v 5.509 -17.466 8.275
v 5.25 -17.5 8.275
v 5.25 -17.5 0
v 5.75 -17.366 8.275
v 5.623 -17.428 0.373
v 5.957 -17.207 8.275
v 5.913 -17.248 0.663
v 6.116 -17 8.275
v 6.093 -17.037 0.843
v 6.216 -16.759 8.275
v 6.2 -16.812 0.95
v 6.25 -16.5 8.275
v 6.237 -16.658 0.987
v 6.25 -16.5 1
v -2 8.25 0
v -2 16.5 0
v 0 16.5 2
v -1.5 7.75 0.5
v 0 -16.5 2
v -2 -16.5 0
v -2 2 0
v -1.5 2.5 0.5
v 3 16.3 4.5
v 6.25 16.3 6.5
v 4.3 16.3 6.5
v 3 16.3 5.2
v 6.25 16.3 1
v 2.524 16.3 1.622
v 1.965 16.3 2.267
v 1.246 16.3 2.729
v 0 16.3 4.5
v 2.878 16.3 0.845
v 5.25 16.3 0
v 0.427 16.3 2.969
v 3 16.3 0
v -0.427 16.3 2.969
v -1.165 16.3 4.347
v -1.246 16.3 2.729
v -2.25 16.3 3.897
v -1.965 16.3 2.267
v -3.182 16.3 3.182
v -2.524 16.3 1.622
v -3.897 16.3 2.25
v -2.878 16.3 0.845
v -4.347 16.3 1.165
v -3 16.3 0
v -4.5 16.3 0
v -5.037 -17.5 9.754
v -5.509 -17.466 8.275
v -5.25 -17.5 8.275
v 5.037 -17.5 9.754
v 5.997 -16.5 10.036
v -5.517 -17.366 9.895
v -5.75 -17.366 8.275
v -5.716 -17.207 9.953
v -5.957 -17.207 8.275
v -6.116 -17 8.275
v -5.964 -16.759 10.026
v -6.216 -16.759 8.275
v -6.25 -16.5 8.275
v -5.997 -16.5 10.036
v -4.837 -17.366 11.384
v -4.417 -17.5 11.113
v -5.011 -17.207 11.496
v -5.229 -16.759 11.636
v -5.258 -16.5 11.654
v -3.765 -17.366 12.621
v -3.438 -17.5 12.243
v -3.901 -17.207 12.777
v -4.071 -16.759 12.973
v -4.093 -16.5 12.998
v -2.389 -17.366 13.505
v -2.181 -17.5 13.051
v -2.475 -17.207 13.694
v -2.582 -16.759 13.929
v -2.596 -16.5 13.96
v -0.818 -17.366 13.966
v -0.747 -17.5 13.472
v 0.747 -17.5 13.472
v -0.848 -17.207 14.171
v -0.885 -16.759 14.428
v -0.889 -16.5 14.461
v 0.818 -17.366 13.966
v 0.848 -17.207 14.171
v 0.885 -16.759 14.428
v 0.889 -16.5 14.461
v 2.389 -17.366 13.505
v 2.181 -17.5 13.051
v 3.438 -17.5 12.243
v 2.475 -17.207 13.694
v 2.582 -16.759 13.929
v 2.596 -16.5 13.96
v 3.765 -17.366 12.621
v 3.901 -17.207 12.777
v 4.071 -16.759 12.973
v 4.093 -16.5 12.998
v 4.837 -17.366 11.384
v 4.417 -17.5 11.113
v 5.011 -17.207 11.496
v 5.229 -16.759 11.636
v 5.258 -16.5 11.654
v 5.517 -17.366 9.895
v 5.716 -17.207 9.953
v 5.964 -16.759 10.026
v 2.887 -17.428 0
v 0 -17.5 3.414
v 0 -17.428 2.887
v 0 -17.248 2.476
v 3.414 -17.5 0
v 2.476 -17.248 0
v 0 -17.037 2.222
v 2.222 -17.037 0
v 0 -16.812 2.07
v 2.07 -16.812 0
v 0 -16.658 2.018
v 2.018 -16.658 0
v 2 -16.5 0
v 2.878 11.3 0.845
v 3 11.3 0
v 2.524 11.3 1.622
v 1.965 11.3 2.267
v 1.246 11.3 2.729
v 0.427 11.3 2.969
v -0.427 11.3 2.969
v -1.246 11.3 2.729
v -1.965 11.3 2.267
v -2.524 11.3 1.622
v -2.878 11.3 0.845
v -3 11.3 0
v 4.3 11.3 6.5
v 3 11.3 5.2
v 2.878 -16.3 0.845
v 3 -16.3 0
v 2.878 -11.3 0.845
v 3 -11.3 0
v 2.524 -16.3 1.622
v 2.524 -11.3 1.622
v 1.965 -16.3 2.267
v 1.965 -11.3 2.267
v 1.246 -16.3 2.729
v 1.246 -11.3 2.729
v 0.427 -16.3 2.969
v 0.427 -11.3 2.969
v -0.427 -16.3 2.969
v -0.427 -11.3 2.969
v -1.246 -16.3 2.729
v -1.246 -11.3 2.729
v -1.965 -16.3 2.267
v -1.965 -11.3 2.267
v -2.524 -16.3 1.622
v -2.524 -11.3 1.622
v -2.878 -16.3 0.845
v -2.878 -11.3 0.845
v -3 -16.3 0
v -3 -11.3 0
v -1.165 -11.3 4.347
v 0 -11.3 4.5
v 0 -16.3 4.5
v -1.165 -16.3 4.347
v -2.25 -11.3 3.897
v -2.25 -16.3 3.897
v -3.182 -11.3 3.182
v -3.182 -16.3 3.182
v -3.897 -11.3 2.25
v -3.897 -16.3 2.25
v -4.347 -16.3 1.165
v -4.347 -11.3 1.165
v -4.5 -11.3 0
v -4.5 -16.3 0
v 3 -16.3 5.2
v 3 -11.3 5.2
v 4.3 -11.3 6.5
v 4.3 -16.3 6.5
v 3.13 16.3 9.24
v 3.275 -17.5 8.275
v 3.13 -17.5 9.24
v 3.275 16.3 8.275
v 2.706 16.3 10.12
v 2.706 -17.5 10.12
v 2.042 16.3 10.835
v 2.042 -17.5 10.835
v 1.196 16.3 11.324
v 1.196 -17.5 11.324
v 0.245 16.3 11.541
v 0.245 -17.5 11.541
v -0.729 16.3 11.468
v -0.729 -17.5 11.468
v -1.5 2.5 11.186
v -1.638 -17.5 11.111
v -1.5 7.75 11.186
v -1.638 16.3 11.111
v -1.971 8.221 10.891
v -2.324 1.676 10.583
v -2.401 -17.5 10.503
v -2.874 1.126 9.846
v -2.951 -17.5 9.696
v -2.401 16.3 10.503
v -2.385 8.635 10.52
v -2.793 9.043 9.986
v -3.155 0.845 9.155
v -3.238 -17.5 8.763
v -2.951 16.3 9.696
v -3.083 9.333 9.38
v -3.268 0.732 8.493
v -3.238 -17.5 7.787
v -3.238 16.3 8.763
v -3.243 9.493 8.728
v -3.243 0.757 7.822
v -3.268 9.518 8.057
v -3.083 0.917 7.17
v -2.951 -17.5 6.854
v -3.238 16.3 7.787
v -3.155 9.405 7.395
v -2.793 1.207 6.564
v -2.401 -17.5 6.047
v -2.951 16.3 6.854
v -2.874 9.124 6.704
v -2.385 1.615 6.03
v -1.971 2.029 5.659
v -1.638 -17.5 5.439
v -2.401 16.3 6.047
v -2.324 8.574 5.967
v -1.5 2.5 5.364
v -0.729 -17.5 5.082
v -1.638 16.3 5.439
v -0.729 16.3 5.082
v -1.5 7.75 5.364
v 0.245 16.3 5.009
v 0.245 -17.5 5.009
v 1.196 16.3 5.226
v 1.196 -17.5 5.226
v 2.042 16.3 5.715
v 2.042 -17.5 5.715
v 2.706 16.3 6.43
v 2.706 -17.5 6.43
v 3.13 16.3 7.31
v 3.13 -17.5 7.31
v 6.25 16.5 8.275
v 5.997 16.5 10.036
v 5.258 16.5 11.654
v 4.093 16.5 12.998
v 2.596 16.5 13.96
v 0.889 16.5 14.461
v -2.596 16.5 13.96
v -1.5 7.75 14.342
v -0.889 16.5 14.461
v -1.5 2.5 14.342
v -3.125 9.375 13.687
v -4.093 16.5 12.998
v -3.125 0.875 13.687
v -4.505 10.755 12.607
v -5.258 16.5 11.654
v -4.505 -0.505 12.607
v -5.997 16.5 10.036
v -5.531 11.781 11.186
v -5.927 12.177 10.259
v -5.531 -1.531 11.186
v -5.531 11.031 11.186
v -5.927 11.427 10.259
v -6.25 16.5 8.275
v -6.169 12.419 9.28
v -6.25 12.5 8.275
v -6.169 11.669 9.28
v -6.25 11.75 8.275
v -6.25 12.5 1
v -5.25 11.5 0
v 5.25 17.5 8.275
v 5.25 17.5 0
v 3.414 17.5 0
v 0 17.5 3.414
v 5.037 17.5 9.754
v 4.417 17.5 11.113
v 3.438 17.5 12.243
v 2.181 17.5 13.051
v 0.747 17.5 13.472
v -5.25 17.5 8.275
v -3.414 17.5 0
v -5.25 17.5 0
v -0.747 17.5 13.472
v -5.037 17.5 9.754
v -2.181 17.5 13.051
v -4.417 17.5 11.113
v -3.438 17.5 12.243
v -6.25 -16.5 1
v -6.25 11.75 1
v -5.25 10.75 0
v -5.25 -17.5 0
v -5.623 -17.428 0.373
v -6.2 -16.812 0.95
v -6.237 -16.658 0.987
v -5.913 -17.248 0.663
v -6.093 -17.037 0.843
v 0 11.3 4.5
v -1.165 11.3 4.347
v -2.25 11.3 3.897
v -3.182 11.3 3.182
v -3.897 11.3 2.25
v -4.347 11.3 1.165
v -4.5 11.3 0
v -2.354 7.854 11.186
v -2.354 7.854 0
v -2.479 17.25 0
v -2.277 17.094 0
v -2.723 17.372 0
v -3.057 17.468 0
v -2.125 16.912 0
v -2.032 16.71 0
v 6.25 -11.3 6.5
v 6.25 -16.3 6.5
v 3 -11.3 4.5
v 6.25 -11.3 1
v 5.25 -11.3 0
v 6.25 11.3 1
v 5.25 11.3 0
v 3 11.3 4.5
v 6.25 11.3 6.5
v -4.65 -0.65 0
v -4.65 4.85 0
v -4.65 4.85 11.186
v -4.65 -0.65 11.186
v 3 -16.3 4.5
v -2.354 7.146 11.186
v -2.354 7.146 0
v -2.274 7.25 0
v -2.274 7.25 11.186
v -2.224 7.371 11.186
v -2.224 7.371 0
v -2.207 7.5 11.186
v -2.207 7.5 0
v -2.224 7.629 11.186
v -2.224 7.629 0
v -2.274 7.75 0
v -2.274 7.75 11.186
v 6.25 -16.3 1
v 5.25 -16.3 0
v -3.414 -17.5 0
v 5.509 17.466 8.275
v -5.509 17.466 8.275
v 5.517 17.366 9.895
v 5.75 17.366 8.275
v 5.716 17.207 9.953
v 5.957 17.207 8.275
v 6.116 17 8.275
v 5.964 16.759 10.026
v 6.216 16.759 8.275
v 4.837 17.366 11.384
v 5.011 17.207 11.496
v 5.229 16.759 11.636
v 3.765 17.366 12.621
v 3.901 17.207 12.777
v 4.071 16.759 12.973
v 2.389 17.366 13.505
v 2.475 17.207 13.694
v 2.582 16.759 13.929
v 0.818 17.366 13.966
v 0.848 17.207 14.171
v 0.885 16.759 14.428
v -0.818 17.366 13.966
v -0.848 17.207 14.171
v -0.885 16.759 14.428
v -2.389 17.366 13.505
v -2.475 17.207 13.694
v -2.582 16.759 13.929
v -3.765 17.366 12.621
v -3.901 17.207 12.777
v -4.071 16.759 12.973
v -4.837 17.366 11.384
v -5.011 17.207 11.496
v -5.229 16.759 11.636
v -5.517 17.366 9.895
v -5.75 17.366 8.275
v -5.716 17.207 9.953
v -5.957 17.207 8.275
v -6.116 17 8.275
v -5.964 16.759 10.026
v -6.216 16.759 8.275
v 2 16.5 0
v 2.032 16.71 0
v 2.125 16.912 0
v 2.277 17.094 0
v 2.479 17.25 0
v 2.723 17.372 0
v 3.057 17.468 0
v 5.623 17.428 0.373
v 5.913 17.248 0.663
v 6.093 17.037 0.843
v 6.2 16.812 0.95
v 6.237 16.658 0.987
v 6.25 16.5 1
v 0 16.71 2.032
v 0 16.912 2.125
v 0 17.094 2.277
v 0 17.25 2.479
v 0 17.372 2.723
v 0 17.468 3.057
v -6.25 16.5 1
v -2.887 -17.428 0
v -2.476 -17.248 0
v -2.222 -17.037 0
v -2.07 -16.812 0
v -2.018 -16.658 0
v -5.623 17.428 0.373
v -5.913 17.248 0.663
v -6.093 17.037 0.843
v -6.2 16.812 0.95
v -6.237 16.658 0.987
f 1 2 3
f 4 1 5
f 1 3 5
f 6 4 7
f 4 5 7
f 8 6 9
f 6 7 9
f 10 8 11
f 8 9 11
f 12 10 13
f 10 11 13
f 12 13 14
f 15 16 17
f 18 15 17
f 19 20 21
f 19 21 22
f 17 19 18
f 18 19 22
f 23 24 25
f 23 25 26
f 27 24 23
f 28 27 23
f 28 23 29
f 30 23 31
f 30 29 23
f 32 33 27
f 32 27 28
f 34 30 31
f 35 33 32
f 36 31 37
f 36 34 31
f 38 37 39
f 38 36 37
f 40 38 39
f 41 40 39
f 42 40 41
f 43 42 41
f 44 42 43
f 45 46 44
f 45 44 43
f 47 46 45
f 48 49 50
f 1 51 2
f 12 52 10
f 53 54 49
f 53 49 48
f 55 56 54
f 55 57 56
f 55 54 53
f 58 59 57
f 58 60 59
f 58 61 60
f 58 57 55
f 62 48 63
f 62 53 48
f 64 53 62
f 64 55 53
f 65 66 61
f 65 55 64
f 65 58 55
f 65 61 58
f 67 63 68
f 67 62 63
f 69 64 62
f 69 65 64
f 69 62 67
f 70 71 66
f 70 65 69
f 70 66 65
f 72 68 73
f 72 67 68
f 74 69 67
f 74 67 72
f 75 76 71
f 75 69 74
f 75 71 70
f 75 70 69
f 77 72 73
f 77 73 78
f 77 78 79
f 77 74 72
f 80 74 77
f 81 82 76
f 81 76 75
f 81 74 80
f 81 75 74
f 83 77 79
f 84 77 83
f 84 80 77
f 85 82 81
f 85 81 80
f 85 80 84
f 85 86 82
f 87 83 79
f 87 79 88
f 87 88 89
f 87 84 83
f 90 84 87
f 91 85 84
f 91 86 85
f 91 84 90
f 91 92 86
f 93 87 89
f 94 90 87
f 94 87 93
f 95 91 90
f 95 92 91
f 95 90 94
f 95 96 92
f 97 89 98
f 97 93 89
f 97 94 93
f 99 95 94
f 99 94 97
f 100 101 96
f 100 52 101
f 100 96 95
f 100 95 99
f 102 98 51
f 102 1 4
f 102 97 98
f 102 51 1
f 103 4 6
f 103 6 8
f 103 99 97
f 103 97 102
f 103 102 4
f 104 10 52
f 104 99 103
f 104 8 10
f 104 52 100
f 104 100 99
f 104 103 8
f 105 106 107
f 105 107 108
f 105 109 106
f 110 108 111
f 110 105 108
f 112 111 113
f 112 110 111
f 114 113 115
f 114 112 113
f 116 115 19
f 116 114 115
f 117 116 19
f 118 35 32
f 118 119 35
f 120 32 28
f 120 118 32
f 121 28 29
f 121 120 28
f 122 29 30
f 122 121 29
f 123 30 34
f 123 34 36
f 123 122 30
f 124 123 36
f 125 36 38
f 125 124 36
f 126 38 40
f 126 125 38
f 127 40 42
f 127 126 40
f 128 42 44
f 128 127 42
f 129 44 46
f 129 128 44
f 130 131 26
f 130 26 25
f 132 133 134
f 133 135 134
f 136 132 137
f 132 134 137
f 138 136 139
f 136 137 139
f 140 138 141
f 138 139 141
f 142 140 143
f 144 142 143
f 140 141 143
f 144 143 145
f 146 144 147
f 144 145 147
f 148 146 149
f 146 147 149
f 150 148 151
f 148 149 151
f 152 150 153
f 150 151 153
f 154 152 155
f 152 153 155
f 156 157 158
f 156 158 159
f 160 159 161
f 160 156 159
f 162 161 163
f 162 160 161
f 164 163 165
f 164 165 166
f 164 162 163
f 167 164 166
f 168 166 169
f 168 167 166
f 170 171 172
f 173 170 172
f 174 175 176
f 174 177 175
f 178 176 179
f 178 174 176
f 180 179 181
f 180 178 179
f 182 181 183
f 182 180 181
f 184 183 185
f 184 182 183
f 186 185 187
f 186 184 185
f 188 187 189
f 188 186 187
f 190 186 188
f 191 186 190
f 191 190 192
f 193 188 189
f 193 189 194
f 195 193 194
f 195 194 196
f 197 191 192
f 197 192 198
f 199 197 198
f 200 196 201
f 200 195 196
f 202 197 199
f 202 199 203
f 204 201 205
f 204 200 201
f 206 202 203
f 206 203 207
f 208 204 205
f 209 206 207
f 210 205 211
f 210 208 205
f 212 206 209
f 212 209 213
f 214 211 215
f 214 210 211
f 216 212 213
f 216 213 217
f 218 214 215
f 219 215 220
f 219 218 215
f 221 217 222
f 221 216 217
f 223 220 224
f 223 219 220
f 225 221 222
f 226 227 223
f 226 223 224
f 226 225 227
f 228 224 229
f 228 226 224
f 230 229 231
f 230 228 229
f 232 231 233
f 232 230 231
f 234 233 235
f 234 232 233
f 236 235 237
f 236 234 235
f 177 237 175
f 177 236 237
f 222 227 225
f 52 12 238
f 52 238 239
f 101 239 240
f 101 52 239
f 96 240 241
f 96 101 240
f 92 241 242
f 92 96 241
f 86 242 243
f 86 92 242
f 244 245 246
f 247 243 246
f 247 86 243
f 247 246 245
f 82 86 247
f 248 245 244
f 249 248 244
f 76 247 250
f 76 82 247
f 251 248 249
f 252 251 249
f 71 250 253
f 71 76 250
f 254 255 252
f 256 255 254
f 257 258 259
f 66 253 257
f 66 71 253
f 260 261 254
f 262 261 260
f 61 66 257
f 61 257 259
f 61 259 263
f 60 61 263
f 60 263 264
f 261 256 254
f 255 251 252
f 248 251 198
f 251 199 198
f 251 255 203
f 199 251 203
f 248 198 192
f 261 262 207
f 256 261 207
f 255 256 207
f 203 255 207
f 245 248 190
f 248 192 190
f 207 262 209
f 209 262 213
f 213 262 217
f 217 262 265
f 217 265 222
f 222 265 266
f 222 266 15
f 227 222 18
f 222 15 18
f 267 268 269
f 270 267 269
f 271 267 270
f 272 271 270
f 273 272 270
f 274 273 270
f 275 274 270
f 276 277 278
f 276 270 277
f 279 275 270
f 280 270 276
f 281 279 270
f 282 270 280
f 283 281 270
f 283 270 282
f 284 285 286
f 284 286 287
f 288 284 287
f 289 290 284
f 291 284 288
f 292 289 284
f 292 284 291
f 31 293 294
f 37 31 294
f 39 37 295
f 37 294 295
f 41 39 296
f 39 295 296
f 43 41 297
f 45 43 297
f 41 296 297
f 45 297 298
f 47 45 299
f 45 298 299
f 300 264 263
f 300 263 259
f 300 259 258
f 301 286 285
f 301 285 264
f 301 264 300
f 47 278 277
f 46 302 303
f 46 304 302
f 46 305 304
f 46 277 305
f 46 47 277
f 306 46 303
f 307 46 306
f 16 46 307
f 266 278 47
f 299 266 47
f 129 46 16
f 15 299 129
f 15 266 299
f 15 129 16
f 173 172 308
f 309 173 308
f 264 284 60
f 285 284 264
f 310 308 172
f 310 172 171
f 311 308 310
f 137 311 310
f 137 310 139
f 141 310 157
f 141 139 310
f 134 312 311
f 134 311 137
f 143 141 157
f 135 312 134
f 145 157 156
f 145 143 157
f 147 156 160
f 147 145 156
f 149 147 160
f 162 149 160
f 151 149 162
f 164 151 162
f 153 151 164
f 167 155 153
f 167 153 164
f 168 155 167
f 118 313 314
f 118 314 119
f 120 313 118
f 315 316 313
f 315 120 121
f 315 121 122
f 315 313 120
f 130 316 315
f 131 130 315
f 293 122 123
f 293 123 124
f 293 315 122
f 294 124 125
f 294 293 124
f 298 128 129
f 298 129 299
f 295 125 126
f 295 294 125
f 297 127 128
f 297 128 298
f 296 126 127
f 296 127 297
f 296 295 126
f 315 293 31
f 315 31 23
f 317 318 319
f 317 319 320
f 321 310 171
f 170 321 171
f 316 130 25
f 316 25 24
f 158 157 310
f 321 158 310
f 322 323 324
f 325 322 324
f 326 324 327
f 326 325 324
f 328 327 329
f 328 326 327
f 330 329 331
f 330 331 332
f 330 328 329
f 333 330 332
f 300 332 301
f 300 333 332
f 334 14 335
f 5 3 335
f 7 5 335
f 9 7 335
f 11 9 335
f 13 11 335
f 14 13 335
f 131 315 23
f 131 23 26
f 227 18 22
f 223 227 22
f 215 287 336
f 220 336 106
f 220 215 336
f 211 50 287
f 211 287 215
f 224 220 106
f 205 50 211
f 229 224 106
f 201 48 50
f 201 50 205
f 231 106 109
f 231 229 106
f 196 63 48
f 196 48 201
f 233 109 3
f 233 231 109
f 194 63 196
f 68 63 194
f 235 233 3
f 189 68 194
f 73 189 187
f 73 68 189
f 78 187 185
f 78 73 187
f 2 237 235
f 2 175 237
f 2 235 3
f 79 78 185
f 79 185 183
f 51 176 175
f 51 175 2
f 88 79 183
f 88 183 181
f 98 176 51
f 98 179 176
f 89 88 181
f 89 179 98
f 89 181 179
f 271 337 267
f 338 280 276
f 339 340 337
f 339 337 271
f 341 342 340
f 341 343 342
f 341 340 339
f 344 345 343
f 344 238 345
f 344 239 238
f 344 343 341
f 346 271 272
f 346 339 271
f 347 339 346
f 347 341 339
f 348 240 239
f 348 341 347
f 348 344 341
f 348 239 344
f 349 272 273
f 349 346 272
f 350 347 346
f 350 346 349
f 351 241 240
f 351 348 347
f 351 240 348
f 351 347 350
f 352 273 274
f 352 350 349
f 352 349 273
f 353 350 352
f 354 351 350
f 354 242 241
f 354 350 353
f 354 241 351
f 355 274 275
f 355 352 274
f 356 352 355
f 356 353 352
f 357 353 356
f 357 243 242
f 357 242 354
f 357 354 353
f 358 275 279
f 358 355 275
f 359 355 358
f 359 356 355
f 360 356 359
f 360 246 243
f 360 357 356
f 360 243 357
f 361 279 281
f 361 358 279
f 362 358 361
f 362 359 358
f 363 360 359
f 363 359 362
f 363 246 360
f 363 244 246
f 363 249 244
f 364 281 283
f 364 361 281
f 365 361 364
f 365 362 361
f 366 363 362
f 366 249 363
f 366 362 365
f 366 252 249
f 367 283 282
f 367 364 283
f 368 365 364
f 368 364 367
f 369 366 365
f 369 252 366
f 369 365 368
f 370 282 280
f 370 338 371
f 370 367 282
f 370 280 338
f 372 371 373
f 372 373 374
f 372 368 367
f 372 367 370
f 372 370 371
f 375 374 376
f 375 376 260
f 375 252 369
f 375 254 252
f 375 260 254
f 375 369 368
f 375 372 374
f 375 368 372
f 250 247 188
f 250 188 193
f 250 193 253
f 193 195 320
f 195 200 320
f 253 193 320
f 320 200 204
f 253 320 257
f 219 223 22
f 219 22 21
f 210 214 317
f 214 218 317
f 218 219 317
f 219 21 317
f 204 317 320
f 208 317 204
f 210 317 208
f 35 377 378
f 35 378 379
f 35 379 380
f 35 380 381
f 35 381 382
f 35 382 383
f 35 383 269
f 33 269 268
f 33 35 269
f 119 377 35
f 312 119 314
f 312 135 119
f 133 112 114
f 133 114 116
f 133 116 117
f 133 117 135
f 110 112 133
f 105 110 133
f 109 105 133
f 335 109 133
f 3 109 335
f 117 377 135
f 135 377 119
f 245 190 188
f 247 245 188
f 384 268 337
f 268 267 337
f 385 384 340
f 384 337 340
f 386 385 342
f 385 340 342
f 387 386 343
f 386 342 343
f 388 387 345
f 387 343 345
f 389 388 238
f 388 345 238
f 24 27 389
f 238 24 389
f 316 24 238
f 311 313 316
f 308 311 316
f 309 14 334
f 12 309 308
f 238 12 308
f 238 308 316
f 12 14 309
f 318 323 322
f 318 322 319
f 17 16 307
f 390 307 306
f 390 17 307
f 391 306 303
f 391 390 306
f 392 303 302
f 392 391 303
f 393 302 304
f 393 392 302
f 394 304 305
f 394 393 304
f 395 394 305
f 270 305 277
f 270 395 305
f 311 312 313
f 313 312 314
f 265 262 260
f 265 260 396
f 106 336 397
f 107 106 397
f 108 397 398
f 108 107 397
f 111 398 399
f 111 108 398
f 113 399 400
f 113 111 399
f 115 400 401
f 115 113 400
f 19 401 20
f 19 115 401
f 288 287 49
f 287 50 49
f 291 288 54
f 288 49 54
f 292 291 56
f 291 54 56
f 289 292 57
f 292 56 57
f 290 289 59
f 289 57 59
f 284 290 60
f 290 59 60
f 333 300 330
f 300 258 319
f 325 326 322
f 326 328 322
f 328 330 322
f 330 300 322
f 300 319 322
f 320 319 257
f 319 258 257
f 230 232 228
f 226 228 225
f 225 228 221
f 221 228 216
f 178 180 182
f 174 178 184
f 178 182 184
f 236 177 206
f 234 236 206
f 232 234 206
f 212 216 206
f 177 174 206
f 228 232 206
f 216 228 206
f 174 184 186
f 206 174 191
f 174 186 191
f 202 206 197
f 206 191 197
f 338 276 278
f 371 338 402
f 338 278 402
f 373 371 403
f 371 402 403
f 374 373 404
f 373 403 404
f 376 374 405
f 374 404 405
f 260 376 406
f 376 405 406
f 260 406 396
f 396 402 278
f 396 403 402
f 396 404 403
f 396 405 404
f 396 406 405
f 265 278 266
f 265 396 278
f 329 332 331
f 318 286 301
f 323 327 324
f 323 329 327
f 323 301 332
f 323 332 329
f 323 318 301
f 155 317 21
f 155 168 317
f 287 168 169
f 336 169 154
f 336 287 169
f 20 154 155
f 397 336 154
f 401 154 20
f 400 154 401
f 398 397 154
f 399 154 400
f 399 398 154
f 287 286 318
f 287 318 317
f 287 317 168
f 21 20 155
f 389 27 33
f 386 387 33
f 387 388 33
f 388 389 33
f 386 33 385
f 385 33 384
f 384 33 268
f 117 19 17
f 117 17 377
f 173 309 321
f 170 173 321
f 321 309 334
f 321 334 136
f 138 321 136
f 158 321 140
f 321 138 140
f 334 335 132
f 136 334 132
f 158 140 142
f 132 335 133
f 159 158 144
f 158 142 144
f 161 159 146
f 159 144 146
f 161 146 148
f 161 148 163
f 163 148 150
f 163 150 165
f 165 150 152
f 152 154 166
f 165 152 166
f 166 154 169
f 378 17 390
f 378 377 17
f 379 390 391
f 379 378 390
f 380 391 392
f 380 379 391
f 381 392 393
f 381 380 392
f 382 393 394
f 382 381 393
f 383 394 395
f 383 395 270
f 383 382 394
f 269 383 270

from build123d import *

# Parameters (mm, degrees)
F0_R      = 3.275
F1_DEPTH  = 17.5
F3_DEPTH  = 14.526
F5_DEPTH  = 11.1862926682
F7_DEPTH  = 35.001
F8_R      = 0.5
F9_W      = 1.5
F9_H      = 5
F12_DEPTH = 5
F13_SIZE  = 1
F14_R     = 1
F15_R     = 3.275
F16_DEPTH = 1.2


# Not quite as in the source:
# - a pattern or mirror of a feature is missing from the dataset's text; its kind, count and spacing are read off the source's solid
# - a feature names something its author has since deleted; it is built from what else it names


with BuildPart() as f1:
    # F0 (on Front) → F1 (new body, symmetric)
    with BuildSketch(Plane.XZ):
        with BuildLine():
            Line((-6.25, 8.275), (-6.25, 0))
            Line((-6.25, 0), (-2, 0))
            Line((-2, 0), (0, 2))
            Line((0, 2), (2, 0))
            Line((2, 0), (6.25, 0))
            Line((6.25, 0), (6.25, 8.275))
            ThreePointArc((6.25, 8.275), (0, 14.525), (-6.25, 8.275))
        make_face()
        with Locations((0, 8.275)):
            Circle(F0_R, mode=Mode.SUBTRACT)
    extrude(amount=F1_DEPTH, both=True)

    # F2 (on face) → F3 (cut, through all)
    with BuildSketch(Plane(origin=(0, 0, 0), x_dir=(1, 0, 0), z_dir=(0, 0, -1))):
        Polygon((-1.5, -2.5), (-6.25, 2.25), (-6.25, -12.5), (-1.5, -7.75), align=None)
    extrude(amount=-F3_DEPTH, mode=Mode.SUBTRACT)

    # F4 (on face) → F5 (join, through all)
    with BuildSketch(Plane(origin=(0, 0, 0), x_dir=(1, 0, 0), z_dir=(0, 0, -1))):
        Polygon((-4.65, 0.65), (-6.25, 2.25), (-6.25, -11.75), (-2, -7.5), (-4.65, -4.85), align=None)
    extrude(amount=-F5_DEPTH)

    # F6 (on face) → F7 (cut, through all)
    with BuildSketch(Plane.XZ.offset(17.5)):
        with BuildLine():
            Line((-6.25, 11.1862926682), (-6.25, 8.275))
            ThreePointArc((-6.25, 8.275), (-6.0674696664, 9.774437177), (-5.5305402087, 11.1862926682))
            Line((-5.5305402087, 11.1862926682), (-6.25, 11.1862926682))
        make_face()
    extrude(amount=-F7_DEPTH, mode=Mode.SUBTRACT)

    # F8
    f8_edges = [f1.edges().sort_by_distance(p)[0] for p in [
        (-2, 7.5, 5.593146),
    ]]
    fillet(f8_edges, radius=F8_R)

    # F9 (on face) → F10 (revolve, cut)
    with BuildSketch(Plane(origin=(0, 0, 0), x_dir=(1, 0, 0), z_dir=(0, 0, -1))):
        with Locations((-3.75, -13.8)):
            Rectangle(F9_W, F9_H)
    f10 = revolve(axis=Axis((0, 0.2600380681, 0), (0, -1, 0)), mode=Mode.SUBTRACT)

    # F10_copies: F10 across plane
    add(f10.mirror(Plane(origin=(0, 0, 0), x_dir=(0, 0, -1), z_dir=(0, -1, 0))), mode=Mode.SUBTRACT)

    # F11 (on face) → F12 (cut, through all)
    with BuildSketch(Plane(origin=(0, 11.3, 0), x_dir=(-1, 0, 0), z_dir=(0, 1, 0))):
        with BuildLine():
            ThreePointArc((-4.5, 0), (-3.1819805153, 3.1819805153), (0, 4.5))
            Line((0, 4.5), (-3, 4.5))
            Line((-3, 4.5), (-3, 5.2))
            Line((-3, 5.2), (-4.3, 6.5))
            Line((-4.3, 6.5), (-6.25, 6.5))
            Line((-6.25, 6.5), (-6.25, 4.5))
            Line((-6.25, 4.5), (-6.25, 0))
            Line((-6.25, 0), (-4.5, 0))
        make_face()
    f12 = extrude(amount=F12_DEPTH, mode=Mode.SUBTRACT)

    # F12_copies: F12 across plane
    add(f12.mirror(Plane(origin=(0, 0, 0), x_dir=(0, 0, -1), z_dir=(0, -1, 0))), mode=Mode.SUBTRACT)

    # F13
    f13_edges = [f1.edges().sort_by_distance(p)[0] for p in [
        (-6.25, 15, 0),
        (-6.25, -2.875, 0),
        (6.25, 0, 0),
        (6.25, -16.9, 0),
        (6.25, 16.9, 0),
    ]]
    chamfer(f13_edges, length=F13_SIZE)

    # F14
    f14_edges = [f1.edges().sort_by_distance(p)[0] for p in [
        (-1, 17.5, 1),
        (1, 17.5, 1),
        (-1, -17.5, 1),
        (1, -17.5, 1),
        (-6.25, 17.5, 4.6375),
        (0, -17.5, 14.525),
        (0, 17.5, 14.525),
        (6.25, 17.5, 4.6375),
        (-6.25, -17.5, 4.6375),
        (6.25, -17.5, 4.6375),
    ]]
    fillet(f14_edges, radius=F14_R)

    # F15 (on face) → F16 (join)
    with BuildSketch(Plane(origin=(0, 17.5, 0), x_dir=(-1, 0, 0), z_dir=(0, 1, 0))):
        with Locations((0, 8.275)):
            Circle(F15_R)
    extrude(amount=-F16_DEPTH)


solid = f1.part
